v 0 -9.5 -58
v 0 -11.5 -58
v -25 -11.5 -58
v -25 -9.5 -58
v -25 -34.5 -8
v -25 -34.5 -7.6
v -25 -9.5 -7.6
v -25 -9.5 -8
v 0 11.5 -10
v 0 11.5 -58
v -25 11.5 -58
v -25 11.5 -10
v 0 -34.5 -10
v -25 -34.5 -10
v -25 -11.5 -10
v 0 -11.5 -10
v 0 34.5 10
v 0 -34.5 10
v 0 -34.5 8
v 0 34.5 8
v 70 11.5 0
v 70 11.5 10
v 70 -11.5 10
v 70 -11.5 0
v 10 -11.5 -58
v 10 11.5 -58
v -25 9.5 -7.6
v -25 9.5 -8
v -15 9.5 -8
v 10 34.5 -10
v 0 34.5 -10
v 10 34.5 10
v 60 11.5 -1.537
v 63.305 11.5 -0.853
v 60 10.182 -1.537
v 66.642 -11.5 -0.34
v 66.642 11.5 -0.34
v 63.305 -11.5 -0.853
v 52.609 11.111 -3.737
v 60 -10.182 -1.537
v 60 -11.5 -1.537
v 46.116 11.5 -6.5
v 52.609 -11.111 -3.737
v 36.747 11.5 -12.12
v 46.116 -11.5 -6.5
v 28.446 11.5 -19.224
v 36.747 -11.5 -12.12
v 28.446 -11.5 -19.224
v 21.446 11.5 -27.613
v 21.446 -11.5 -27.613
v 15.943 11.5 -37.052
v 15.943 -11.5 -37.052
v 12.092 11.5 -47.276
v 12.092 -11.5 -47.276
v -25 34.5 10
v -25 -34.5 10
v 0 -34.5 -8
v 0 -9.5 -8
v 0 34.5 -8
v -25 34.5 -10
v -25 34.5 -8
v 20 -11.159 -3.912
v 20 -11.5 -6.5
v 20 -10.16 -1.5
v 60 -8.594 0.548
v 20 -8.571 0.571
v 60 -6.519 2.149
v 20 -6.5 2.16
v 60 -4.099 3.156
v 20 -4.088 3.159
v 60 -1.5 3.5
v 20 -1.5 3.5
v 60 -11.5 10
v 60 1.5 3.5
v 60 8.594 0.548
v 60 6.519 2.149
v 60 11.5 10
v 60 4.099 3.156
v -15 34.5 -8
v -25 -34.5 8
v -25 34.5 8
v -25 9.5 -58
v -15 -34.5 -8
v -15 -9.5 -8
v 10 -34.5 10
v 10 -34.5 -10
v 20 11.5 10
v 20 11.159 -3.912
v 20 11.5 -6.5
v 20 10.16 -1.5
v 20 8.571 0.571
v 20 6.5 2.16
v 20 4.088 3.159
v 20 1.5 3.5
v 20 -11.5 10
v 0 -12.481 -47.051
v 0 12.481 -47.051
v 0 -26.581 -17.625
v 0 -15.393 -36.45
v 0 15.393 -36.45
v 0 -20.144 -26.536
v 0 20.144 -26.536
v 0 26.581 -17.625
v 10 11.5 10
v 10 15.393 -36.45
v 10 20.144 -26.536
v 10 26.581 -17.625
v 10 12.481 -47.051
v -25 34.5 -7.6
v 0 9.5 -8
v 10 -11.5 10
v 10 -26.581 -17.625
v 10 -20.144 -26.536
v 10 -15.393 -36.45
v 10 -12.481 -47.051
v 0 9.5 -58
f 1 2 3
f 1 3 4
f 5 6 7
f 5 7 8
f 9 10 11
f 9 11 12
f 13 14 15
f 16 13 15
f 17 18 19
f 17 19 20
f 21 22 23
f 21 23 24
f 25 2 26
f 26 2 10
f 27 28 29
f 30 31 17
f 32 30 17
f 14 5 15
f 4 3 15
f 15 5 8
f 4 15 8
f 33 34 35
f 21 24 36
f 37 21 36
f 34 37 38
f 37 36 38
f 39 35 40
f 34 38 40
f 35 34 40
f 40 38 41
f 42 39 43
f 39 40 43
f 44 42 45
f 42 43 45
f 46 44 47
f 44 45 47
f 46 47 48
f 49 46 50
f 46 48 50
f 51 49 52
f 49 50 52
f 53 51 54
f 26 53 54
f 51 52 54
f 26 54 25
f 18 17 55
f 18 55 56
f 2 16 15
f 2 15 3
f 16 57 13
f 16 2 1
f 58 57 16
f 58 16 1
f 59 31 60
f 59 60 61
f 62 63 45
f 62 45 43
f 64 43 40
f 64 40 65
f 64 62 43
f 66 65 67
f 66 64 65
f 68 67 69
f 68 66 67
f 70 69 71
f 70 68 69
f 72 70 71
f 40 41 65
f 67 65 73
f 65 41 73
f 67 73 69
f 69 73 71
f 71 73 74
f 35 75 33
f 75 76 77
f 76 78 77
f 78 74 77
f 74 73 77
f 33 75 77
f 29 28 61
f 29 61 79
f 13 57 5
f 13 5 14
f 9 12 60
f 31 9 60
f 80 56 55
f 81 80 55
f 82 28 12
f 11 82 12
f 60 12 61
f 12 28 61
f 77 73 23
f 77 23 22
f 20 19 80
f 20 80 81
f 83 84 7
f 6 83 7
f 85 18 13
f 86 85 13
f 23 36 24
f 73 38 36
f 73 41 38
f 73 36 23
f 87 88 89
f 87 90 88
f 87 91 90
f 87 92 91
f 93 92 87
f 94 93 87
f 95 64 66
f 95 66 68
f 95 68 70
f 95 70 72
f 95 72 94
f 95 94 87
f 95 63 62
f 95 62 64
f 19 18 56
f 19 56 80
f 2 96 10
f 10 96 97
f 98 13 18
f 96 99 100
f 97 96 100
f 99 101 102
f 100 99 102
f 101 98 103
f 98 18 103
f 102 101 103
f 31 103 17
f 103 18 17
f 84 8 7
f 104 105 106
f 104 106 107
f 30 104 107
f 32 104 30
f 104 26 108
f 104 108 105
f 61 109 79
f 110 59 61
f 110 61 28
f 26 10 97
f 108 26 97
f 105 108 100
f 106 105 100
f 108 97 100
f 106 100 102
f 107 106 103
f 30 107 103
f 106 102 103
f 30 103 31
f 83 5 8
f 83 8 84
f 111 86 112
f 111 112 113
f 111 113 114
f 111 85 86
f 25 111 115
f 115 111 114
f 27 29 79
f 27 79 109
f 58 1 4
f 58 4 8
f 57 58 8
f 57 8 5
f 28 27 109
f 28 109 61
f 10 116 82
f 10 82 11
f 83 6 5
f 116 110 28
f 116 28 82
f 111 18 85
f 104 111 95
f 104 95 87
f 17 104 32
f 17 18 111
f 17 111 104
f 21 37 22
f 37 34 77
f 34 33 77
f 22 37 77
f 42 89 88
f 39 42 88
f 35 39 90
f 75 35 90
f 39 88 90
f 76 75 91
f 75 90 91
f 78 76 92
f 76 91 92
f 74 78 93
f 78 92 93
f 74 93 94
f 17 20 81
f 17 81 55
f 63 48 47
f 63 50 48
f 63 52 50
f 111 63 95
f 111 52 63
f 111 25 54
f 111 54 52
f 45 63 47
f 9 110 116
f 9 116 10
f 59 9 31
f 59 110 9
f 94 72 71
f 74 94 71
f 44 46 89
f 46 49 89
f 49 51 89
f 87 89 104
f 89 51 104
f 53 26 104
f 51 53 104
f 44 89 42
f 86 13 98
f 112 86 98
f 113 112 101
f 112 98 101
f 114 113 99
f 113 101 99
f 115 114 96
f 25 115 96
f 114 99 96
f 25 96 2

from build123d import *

# Parameters (mm, degrees)
F1_DEPTH     = 25
F2_DEPTH     = 10
F5_DEPTH     = 69
F6_W         = 19
F6_H         = 1.5
F7_DEPTH     = 10
F8_W         = 23
F8_H         = 68
F9_DEPTH     = 100
F10_W        = 40
F10_H        = 6.5
F11_DEPTH    = 46.001
F12_DEPTH    = 23.001
F13_T1_DEPTH = 40


# Not quite as in the source:
# - a fillet or chamfer that OpenCascade refuses, or shapes differently, is made with other operations: its cross-section is extruded or revolved along the edge and cut away or added
# - a feature names something its author has since deleted; it is built from what else it names


with BuildPart() as f1:
    # F0 (on Right) → F1 (new body)
    with BuildSketch(Plane.YZ):
        Polygon((-9.5, -8), (-34.5, -8), (-34.5, -10), (-11.5, -10), (-11.5, -58), (-9.5, -58), align=None)
    extrude(amount=-F1_DEPTH)

    # F10 (on face) → F12 (cut, through all)
    with BuildSketch(Plane.XZ.offset(11.5)):
        with Locations((40, 6.75)):
            Rectangle(F10_W, F10_H)
        with BuildLine():
            Line((110, 10), (70, 10))
            Line((70, 10), (70, 0))
            ThreePointArc((70, 0), (29.5210578409, -18.1597150078), (10, -58))
            Line((10, -58), (110, -58))
            Line((110, -58), (110, 10))
        make_face()
    extrude(amount=F12_DEPTH, mode=Mode.SUBTRACT)


with BuildPart() as f1b:
    # F0 (on Right) → F1, piece 2 (new body)
    with BuildSketch(Plane.YZ):
        Polygon((34.5, -10), (34.5, -8), (9.5, -8), (9.5, -58), (11.5, -58), (11.5, -10), align=None)
    extrude(amount=-F1_DEPTH)


with BuildPart() as f1c:
    # F0 (on Right) → F1, piece 3 (new body)
    with BuildSketch(Plane.YZ):
        Polygon((-9.5, 8), (9.5, 8), (34.5, 8), (34.5, 10), (9.5, 10), (-9.5, 10), (-34.5, 10), (-34.5, 8), align=None)
    extrude(amount=-F1_DEPTH)


with BuildPart() as f2:
    # F0 (on Right) → F2 (new body)
    with BuildSketch(Plane.YZ):
        with BuildLine():
            ThreePointArc((11.5, -58), (17.5468519701, -31.3870332357), (34.5, -10))
            Line((34.5, -10), (11.5, -10))
            Line((11.5, -10), (11.5, -58))
        make_face()
        Polygon((34.5, 8), (9.5, 8), (-9.5, 8), (-34.5, 8), (-34.5, -8), (-9.5, -8), (-9.5, -58), (9.5, -58), (9.5, -8), (34.5, -8), align=None)
        with BuildLine():
            Line((-11.5, -10), (-34.5, -10))
            ThreePointArc((-34.5, -10), (-17.5468519701, -31.3870332357), (-11.5, -58))
            Line((-11.5, -58), (-11.5, -10))
        make_face()
        Polygon((-9.5, -8), (-34.5, -8), (-34.5, -10), (-11.5, -10), (-11.5, -58), (-9.5, -58), align=None)
        Polygon((34.5, -10), (34.5, -8), (9.5, -8), (9.5, -58), (11.5, -58), (11.5, -10), align=None)
        Polygon((-9.5, 8), (9.5, 8), (34.5, 8), (34.5, 10), (9.5, 10), (-9.5, 10), (-34.5, 10), (-34.5, 8), align=None)
    extrude(amount=F2_DEPTH)

    # F8 (on face) → F9 (join)
    with BuildSketch(Plane.YZ.offset(10)):
        with Locations((0, -24)):
            Rectangle(F8_W, F8_H)
    extrude(amount=F9_DEPTH)

    # F10 (on face) → F11 (cut, through all)
    with BuildSketch(Plane.XZ.offset(11.5)):
        with Locations((40, 6.75)):
            Rectangle(F10_W, F10_H)
        with BuildLine():
            Line((110, 10), (70, 10))
            Line((70, 10), (70, 0))
            ThreePointArc((70, 0), (29.5210578409, -18.1597150078), (10, -58))
            Line((10, -58), (110, -58))
            Line((110, -58), (110, 10))
        make_face()
    extrude(amount=-F11_DEPTH, mode=Mode.SUBTRACT)

    # F13: fillet of radius 10 on 2 edges, made by hand

    # F13_s2 → F13_t1 (cut)
    with BuildSketch(Plane.YZ.offset(20)):
        with BuildLine():
            ThreePointArc((11.5, -6.5), (8.5710678119, 0.5710678119), (1.5, 3.5))
            Line((1.5, 3.5), (11.5, 3.5))
            Line((11.5, 3.5), (11.5, -6.5))
        make_face()
        with BuildLine():
            ThreePointArc((-11.5, -6.5), (-8.5710678119, 0.5710678119), (-1.5, 3.5))
            Line((-1.5, 3.5), (-11.5, 3.5))
            Line((-11.5, 3.5), (-11.5, -6.5))
        make_face()
    extrude(amount=F13_T1_DEPTH, mode=Mode.SUBTRACT)


with BuildPart() as f5:
    # F4 (on face) → F5 (new body)
    with BuildSketch(Plane.XZ.offset(34.5)):
        Polygon((-25, -7.6), (-25, -8), (-15, -8), align=None)
    extrude(amount=-F5_DEPTH)

    # F6 (on face) → F7 (cut)
    with BuildSketch(Plane(origin=(-25, 0, 0), x_dir=(0, -1, 0), z_dir=(-1, 0, 0))):
        with Locations((0, -7.25)):
            Rectangle(F6_W, F6_H)
    extrude(amount=-F7_DEPTH, mode=Mode.SUBTRACT)


solid = Compound([f1.part, f1b.part, f1c.part, f2.part, f5.part])
